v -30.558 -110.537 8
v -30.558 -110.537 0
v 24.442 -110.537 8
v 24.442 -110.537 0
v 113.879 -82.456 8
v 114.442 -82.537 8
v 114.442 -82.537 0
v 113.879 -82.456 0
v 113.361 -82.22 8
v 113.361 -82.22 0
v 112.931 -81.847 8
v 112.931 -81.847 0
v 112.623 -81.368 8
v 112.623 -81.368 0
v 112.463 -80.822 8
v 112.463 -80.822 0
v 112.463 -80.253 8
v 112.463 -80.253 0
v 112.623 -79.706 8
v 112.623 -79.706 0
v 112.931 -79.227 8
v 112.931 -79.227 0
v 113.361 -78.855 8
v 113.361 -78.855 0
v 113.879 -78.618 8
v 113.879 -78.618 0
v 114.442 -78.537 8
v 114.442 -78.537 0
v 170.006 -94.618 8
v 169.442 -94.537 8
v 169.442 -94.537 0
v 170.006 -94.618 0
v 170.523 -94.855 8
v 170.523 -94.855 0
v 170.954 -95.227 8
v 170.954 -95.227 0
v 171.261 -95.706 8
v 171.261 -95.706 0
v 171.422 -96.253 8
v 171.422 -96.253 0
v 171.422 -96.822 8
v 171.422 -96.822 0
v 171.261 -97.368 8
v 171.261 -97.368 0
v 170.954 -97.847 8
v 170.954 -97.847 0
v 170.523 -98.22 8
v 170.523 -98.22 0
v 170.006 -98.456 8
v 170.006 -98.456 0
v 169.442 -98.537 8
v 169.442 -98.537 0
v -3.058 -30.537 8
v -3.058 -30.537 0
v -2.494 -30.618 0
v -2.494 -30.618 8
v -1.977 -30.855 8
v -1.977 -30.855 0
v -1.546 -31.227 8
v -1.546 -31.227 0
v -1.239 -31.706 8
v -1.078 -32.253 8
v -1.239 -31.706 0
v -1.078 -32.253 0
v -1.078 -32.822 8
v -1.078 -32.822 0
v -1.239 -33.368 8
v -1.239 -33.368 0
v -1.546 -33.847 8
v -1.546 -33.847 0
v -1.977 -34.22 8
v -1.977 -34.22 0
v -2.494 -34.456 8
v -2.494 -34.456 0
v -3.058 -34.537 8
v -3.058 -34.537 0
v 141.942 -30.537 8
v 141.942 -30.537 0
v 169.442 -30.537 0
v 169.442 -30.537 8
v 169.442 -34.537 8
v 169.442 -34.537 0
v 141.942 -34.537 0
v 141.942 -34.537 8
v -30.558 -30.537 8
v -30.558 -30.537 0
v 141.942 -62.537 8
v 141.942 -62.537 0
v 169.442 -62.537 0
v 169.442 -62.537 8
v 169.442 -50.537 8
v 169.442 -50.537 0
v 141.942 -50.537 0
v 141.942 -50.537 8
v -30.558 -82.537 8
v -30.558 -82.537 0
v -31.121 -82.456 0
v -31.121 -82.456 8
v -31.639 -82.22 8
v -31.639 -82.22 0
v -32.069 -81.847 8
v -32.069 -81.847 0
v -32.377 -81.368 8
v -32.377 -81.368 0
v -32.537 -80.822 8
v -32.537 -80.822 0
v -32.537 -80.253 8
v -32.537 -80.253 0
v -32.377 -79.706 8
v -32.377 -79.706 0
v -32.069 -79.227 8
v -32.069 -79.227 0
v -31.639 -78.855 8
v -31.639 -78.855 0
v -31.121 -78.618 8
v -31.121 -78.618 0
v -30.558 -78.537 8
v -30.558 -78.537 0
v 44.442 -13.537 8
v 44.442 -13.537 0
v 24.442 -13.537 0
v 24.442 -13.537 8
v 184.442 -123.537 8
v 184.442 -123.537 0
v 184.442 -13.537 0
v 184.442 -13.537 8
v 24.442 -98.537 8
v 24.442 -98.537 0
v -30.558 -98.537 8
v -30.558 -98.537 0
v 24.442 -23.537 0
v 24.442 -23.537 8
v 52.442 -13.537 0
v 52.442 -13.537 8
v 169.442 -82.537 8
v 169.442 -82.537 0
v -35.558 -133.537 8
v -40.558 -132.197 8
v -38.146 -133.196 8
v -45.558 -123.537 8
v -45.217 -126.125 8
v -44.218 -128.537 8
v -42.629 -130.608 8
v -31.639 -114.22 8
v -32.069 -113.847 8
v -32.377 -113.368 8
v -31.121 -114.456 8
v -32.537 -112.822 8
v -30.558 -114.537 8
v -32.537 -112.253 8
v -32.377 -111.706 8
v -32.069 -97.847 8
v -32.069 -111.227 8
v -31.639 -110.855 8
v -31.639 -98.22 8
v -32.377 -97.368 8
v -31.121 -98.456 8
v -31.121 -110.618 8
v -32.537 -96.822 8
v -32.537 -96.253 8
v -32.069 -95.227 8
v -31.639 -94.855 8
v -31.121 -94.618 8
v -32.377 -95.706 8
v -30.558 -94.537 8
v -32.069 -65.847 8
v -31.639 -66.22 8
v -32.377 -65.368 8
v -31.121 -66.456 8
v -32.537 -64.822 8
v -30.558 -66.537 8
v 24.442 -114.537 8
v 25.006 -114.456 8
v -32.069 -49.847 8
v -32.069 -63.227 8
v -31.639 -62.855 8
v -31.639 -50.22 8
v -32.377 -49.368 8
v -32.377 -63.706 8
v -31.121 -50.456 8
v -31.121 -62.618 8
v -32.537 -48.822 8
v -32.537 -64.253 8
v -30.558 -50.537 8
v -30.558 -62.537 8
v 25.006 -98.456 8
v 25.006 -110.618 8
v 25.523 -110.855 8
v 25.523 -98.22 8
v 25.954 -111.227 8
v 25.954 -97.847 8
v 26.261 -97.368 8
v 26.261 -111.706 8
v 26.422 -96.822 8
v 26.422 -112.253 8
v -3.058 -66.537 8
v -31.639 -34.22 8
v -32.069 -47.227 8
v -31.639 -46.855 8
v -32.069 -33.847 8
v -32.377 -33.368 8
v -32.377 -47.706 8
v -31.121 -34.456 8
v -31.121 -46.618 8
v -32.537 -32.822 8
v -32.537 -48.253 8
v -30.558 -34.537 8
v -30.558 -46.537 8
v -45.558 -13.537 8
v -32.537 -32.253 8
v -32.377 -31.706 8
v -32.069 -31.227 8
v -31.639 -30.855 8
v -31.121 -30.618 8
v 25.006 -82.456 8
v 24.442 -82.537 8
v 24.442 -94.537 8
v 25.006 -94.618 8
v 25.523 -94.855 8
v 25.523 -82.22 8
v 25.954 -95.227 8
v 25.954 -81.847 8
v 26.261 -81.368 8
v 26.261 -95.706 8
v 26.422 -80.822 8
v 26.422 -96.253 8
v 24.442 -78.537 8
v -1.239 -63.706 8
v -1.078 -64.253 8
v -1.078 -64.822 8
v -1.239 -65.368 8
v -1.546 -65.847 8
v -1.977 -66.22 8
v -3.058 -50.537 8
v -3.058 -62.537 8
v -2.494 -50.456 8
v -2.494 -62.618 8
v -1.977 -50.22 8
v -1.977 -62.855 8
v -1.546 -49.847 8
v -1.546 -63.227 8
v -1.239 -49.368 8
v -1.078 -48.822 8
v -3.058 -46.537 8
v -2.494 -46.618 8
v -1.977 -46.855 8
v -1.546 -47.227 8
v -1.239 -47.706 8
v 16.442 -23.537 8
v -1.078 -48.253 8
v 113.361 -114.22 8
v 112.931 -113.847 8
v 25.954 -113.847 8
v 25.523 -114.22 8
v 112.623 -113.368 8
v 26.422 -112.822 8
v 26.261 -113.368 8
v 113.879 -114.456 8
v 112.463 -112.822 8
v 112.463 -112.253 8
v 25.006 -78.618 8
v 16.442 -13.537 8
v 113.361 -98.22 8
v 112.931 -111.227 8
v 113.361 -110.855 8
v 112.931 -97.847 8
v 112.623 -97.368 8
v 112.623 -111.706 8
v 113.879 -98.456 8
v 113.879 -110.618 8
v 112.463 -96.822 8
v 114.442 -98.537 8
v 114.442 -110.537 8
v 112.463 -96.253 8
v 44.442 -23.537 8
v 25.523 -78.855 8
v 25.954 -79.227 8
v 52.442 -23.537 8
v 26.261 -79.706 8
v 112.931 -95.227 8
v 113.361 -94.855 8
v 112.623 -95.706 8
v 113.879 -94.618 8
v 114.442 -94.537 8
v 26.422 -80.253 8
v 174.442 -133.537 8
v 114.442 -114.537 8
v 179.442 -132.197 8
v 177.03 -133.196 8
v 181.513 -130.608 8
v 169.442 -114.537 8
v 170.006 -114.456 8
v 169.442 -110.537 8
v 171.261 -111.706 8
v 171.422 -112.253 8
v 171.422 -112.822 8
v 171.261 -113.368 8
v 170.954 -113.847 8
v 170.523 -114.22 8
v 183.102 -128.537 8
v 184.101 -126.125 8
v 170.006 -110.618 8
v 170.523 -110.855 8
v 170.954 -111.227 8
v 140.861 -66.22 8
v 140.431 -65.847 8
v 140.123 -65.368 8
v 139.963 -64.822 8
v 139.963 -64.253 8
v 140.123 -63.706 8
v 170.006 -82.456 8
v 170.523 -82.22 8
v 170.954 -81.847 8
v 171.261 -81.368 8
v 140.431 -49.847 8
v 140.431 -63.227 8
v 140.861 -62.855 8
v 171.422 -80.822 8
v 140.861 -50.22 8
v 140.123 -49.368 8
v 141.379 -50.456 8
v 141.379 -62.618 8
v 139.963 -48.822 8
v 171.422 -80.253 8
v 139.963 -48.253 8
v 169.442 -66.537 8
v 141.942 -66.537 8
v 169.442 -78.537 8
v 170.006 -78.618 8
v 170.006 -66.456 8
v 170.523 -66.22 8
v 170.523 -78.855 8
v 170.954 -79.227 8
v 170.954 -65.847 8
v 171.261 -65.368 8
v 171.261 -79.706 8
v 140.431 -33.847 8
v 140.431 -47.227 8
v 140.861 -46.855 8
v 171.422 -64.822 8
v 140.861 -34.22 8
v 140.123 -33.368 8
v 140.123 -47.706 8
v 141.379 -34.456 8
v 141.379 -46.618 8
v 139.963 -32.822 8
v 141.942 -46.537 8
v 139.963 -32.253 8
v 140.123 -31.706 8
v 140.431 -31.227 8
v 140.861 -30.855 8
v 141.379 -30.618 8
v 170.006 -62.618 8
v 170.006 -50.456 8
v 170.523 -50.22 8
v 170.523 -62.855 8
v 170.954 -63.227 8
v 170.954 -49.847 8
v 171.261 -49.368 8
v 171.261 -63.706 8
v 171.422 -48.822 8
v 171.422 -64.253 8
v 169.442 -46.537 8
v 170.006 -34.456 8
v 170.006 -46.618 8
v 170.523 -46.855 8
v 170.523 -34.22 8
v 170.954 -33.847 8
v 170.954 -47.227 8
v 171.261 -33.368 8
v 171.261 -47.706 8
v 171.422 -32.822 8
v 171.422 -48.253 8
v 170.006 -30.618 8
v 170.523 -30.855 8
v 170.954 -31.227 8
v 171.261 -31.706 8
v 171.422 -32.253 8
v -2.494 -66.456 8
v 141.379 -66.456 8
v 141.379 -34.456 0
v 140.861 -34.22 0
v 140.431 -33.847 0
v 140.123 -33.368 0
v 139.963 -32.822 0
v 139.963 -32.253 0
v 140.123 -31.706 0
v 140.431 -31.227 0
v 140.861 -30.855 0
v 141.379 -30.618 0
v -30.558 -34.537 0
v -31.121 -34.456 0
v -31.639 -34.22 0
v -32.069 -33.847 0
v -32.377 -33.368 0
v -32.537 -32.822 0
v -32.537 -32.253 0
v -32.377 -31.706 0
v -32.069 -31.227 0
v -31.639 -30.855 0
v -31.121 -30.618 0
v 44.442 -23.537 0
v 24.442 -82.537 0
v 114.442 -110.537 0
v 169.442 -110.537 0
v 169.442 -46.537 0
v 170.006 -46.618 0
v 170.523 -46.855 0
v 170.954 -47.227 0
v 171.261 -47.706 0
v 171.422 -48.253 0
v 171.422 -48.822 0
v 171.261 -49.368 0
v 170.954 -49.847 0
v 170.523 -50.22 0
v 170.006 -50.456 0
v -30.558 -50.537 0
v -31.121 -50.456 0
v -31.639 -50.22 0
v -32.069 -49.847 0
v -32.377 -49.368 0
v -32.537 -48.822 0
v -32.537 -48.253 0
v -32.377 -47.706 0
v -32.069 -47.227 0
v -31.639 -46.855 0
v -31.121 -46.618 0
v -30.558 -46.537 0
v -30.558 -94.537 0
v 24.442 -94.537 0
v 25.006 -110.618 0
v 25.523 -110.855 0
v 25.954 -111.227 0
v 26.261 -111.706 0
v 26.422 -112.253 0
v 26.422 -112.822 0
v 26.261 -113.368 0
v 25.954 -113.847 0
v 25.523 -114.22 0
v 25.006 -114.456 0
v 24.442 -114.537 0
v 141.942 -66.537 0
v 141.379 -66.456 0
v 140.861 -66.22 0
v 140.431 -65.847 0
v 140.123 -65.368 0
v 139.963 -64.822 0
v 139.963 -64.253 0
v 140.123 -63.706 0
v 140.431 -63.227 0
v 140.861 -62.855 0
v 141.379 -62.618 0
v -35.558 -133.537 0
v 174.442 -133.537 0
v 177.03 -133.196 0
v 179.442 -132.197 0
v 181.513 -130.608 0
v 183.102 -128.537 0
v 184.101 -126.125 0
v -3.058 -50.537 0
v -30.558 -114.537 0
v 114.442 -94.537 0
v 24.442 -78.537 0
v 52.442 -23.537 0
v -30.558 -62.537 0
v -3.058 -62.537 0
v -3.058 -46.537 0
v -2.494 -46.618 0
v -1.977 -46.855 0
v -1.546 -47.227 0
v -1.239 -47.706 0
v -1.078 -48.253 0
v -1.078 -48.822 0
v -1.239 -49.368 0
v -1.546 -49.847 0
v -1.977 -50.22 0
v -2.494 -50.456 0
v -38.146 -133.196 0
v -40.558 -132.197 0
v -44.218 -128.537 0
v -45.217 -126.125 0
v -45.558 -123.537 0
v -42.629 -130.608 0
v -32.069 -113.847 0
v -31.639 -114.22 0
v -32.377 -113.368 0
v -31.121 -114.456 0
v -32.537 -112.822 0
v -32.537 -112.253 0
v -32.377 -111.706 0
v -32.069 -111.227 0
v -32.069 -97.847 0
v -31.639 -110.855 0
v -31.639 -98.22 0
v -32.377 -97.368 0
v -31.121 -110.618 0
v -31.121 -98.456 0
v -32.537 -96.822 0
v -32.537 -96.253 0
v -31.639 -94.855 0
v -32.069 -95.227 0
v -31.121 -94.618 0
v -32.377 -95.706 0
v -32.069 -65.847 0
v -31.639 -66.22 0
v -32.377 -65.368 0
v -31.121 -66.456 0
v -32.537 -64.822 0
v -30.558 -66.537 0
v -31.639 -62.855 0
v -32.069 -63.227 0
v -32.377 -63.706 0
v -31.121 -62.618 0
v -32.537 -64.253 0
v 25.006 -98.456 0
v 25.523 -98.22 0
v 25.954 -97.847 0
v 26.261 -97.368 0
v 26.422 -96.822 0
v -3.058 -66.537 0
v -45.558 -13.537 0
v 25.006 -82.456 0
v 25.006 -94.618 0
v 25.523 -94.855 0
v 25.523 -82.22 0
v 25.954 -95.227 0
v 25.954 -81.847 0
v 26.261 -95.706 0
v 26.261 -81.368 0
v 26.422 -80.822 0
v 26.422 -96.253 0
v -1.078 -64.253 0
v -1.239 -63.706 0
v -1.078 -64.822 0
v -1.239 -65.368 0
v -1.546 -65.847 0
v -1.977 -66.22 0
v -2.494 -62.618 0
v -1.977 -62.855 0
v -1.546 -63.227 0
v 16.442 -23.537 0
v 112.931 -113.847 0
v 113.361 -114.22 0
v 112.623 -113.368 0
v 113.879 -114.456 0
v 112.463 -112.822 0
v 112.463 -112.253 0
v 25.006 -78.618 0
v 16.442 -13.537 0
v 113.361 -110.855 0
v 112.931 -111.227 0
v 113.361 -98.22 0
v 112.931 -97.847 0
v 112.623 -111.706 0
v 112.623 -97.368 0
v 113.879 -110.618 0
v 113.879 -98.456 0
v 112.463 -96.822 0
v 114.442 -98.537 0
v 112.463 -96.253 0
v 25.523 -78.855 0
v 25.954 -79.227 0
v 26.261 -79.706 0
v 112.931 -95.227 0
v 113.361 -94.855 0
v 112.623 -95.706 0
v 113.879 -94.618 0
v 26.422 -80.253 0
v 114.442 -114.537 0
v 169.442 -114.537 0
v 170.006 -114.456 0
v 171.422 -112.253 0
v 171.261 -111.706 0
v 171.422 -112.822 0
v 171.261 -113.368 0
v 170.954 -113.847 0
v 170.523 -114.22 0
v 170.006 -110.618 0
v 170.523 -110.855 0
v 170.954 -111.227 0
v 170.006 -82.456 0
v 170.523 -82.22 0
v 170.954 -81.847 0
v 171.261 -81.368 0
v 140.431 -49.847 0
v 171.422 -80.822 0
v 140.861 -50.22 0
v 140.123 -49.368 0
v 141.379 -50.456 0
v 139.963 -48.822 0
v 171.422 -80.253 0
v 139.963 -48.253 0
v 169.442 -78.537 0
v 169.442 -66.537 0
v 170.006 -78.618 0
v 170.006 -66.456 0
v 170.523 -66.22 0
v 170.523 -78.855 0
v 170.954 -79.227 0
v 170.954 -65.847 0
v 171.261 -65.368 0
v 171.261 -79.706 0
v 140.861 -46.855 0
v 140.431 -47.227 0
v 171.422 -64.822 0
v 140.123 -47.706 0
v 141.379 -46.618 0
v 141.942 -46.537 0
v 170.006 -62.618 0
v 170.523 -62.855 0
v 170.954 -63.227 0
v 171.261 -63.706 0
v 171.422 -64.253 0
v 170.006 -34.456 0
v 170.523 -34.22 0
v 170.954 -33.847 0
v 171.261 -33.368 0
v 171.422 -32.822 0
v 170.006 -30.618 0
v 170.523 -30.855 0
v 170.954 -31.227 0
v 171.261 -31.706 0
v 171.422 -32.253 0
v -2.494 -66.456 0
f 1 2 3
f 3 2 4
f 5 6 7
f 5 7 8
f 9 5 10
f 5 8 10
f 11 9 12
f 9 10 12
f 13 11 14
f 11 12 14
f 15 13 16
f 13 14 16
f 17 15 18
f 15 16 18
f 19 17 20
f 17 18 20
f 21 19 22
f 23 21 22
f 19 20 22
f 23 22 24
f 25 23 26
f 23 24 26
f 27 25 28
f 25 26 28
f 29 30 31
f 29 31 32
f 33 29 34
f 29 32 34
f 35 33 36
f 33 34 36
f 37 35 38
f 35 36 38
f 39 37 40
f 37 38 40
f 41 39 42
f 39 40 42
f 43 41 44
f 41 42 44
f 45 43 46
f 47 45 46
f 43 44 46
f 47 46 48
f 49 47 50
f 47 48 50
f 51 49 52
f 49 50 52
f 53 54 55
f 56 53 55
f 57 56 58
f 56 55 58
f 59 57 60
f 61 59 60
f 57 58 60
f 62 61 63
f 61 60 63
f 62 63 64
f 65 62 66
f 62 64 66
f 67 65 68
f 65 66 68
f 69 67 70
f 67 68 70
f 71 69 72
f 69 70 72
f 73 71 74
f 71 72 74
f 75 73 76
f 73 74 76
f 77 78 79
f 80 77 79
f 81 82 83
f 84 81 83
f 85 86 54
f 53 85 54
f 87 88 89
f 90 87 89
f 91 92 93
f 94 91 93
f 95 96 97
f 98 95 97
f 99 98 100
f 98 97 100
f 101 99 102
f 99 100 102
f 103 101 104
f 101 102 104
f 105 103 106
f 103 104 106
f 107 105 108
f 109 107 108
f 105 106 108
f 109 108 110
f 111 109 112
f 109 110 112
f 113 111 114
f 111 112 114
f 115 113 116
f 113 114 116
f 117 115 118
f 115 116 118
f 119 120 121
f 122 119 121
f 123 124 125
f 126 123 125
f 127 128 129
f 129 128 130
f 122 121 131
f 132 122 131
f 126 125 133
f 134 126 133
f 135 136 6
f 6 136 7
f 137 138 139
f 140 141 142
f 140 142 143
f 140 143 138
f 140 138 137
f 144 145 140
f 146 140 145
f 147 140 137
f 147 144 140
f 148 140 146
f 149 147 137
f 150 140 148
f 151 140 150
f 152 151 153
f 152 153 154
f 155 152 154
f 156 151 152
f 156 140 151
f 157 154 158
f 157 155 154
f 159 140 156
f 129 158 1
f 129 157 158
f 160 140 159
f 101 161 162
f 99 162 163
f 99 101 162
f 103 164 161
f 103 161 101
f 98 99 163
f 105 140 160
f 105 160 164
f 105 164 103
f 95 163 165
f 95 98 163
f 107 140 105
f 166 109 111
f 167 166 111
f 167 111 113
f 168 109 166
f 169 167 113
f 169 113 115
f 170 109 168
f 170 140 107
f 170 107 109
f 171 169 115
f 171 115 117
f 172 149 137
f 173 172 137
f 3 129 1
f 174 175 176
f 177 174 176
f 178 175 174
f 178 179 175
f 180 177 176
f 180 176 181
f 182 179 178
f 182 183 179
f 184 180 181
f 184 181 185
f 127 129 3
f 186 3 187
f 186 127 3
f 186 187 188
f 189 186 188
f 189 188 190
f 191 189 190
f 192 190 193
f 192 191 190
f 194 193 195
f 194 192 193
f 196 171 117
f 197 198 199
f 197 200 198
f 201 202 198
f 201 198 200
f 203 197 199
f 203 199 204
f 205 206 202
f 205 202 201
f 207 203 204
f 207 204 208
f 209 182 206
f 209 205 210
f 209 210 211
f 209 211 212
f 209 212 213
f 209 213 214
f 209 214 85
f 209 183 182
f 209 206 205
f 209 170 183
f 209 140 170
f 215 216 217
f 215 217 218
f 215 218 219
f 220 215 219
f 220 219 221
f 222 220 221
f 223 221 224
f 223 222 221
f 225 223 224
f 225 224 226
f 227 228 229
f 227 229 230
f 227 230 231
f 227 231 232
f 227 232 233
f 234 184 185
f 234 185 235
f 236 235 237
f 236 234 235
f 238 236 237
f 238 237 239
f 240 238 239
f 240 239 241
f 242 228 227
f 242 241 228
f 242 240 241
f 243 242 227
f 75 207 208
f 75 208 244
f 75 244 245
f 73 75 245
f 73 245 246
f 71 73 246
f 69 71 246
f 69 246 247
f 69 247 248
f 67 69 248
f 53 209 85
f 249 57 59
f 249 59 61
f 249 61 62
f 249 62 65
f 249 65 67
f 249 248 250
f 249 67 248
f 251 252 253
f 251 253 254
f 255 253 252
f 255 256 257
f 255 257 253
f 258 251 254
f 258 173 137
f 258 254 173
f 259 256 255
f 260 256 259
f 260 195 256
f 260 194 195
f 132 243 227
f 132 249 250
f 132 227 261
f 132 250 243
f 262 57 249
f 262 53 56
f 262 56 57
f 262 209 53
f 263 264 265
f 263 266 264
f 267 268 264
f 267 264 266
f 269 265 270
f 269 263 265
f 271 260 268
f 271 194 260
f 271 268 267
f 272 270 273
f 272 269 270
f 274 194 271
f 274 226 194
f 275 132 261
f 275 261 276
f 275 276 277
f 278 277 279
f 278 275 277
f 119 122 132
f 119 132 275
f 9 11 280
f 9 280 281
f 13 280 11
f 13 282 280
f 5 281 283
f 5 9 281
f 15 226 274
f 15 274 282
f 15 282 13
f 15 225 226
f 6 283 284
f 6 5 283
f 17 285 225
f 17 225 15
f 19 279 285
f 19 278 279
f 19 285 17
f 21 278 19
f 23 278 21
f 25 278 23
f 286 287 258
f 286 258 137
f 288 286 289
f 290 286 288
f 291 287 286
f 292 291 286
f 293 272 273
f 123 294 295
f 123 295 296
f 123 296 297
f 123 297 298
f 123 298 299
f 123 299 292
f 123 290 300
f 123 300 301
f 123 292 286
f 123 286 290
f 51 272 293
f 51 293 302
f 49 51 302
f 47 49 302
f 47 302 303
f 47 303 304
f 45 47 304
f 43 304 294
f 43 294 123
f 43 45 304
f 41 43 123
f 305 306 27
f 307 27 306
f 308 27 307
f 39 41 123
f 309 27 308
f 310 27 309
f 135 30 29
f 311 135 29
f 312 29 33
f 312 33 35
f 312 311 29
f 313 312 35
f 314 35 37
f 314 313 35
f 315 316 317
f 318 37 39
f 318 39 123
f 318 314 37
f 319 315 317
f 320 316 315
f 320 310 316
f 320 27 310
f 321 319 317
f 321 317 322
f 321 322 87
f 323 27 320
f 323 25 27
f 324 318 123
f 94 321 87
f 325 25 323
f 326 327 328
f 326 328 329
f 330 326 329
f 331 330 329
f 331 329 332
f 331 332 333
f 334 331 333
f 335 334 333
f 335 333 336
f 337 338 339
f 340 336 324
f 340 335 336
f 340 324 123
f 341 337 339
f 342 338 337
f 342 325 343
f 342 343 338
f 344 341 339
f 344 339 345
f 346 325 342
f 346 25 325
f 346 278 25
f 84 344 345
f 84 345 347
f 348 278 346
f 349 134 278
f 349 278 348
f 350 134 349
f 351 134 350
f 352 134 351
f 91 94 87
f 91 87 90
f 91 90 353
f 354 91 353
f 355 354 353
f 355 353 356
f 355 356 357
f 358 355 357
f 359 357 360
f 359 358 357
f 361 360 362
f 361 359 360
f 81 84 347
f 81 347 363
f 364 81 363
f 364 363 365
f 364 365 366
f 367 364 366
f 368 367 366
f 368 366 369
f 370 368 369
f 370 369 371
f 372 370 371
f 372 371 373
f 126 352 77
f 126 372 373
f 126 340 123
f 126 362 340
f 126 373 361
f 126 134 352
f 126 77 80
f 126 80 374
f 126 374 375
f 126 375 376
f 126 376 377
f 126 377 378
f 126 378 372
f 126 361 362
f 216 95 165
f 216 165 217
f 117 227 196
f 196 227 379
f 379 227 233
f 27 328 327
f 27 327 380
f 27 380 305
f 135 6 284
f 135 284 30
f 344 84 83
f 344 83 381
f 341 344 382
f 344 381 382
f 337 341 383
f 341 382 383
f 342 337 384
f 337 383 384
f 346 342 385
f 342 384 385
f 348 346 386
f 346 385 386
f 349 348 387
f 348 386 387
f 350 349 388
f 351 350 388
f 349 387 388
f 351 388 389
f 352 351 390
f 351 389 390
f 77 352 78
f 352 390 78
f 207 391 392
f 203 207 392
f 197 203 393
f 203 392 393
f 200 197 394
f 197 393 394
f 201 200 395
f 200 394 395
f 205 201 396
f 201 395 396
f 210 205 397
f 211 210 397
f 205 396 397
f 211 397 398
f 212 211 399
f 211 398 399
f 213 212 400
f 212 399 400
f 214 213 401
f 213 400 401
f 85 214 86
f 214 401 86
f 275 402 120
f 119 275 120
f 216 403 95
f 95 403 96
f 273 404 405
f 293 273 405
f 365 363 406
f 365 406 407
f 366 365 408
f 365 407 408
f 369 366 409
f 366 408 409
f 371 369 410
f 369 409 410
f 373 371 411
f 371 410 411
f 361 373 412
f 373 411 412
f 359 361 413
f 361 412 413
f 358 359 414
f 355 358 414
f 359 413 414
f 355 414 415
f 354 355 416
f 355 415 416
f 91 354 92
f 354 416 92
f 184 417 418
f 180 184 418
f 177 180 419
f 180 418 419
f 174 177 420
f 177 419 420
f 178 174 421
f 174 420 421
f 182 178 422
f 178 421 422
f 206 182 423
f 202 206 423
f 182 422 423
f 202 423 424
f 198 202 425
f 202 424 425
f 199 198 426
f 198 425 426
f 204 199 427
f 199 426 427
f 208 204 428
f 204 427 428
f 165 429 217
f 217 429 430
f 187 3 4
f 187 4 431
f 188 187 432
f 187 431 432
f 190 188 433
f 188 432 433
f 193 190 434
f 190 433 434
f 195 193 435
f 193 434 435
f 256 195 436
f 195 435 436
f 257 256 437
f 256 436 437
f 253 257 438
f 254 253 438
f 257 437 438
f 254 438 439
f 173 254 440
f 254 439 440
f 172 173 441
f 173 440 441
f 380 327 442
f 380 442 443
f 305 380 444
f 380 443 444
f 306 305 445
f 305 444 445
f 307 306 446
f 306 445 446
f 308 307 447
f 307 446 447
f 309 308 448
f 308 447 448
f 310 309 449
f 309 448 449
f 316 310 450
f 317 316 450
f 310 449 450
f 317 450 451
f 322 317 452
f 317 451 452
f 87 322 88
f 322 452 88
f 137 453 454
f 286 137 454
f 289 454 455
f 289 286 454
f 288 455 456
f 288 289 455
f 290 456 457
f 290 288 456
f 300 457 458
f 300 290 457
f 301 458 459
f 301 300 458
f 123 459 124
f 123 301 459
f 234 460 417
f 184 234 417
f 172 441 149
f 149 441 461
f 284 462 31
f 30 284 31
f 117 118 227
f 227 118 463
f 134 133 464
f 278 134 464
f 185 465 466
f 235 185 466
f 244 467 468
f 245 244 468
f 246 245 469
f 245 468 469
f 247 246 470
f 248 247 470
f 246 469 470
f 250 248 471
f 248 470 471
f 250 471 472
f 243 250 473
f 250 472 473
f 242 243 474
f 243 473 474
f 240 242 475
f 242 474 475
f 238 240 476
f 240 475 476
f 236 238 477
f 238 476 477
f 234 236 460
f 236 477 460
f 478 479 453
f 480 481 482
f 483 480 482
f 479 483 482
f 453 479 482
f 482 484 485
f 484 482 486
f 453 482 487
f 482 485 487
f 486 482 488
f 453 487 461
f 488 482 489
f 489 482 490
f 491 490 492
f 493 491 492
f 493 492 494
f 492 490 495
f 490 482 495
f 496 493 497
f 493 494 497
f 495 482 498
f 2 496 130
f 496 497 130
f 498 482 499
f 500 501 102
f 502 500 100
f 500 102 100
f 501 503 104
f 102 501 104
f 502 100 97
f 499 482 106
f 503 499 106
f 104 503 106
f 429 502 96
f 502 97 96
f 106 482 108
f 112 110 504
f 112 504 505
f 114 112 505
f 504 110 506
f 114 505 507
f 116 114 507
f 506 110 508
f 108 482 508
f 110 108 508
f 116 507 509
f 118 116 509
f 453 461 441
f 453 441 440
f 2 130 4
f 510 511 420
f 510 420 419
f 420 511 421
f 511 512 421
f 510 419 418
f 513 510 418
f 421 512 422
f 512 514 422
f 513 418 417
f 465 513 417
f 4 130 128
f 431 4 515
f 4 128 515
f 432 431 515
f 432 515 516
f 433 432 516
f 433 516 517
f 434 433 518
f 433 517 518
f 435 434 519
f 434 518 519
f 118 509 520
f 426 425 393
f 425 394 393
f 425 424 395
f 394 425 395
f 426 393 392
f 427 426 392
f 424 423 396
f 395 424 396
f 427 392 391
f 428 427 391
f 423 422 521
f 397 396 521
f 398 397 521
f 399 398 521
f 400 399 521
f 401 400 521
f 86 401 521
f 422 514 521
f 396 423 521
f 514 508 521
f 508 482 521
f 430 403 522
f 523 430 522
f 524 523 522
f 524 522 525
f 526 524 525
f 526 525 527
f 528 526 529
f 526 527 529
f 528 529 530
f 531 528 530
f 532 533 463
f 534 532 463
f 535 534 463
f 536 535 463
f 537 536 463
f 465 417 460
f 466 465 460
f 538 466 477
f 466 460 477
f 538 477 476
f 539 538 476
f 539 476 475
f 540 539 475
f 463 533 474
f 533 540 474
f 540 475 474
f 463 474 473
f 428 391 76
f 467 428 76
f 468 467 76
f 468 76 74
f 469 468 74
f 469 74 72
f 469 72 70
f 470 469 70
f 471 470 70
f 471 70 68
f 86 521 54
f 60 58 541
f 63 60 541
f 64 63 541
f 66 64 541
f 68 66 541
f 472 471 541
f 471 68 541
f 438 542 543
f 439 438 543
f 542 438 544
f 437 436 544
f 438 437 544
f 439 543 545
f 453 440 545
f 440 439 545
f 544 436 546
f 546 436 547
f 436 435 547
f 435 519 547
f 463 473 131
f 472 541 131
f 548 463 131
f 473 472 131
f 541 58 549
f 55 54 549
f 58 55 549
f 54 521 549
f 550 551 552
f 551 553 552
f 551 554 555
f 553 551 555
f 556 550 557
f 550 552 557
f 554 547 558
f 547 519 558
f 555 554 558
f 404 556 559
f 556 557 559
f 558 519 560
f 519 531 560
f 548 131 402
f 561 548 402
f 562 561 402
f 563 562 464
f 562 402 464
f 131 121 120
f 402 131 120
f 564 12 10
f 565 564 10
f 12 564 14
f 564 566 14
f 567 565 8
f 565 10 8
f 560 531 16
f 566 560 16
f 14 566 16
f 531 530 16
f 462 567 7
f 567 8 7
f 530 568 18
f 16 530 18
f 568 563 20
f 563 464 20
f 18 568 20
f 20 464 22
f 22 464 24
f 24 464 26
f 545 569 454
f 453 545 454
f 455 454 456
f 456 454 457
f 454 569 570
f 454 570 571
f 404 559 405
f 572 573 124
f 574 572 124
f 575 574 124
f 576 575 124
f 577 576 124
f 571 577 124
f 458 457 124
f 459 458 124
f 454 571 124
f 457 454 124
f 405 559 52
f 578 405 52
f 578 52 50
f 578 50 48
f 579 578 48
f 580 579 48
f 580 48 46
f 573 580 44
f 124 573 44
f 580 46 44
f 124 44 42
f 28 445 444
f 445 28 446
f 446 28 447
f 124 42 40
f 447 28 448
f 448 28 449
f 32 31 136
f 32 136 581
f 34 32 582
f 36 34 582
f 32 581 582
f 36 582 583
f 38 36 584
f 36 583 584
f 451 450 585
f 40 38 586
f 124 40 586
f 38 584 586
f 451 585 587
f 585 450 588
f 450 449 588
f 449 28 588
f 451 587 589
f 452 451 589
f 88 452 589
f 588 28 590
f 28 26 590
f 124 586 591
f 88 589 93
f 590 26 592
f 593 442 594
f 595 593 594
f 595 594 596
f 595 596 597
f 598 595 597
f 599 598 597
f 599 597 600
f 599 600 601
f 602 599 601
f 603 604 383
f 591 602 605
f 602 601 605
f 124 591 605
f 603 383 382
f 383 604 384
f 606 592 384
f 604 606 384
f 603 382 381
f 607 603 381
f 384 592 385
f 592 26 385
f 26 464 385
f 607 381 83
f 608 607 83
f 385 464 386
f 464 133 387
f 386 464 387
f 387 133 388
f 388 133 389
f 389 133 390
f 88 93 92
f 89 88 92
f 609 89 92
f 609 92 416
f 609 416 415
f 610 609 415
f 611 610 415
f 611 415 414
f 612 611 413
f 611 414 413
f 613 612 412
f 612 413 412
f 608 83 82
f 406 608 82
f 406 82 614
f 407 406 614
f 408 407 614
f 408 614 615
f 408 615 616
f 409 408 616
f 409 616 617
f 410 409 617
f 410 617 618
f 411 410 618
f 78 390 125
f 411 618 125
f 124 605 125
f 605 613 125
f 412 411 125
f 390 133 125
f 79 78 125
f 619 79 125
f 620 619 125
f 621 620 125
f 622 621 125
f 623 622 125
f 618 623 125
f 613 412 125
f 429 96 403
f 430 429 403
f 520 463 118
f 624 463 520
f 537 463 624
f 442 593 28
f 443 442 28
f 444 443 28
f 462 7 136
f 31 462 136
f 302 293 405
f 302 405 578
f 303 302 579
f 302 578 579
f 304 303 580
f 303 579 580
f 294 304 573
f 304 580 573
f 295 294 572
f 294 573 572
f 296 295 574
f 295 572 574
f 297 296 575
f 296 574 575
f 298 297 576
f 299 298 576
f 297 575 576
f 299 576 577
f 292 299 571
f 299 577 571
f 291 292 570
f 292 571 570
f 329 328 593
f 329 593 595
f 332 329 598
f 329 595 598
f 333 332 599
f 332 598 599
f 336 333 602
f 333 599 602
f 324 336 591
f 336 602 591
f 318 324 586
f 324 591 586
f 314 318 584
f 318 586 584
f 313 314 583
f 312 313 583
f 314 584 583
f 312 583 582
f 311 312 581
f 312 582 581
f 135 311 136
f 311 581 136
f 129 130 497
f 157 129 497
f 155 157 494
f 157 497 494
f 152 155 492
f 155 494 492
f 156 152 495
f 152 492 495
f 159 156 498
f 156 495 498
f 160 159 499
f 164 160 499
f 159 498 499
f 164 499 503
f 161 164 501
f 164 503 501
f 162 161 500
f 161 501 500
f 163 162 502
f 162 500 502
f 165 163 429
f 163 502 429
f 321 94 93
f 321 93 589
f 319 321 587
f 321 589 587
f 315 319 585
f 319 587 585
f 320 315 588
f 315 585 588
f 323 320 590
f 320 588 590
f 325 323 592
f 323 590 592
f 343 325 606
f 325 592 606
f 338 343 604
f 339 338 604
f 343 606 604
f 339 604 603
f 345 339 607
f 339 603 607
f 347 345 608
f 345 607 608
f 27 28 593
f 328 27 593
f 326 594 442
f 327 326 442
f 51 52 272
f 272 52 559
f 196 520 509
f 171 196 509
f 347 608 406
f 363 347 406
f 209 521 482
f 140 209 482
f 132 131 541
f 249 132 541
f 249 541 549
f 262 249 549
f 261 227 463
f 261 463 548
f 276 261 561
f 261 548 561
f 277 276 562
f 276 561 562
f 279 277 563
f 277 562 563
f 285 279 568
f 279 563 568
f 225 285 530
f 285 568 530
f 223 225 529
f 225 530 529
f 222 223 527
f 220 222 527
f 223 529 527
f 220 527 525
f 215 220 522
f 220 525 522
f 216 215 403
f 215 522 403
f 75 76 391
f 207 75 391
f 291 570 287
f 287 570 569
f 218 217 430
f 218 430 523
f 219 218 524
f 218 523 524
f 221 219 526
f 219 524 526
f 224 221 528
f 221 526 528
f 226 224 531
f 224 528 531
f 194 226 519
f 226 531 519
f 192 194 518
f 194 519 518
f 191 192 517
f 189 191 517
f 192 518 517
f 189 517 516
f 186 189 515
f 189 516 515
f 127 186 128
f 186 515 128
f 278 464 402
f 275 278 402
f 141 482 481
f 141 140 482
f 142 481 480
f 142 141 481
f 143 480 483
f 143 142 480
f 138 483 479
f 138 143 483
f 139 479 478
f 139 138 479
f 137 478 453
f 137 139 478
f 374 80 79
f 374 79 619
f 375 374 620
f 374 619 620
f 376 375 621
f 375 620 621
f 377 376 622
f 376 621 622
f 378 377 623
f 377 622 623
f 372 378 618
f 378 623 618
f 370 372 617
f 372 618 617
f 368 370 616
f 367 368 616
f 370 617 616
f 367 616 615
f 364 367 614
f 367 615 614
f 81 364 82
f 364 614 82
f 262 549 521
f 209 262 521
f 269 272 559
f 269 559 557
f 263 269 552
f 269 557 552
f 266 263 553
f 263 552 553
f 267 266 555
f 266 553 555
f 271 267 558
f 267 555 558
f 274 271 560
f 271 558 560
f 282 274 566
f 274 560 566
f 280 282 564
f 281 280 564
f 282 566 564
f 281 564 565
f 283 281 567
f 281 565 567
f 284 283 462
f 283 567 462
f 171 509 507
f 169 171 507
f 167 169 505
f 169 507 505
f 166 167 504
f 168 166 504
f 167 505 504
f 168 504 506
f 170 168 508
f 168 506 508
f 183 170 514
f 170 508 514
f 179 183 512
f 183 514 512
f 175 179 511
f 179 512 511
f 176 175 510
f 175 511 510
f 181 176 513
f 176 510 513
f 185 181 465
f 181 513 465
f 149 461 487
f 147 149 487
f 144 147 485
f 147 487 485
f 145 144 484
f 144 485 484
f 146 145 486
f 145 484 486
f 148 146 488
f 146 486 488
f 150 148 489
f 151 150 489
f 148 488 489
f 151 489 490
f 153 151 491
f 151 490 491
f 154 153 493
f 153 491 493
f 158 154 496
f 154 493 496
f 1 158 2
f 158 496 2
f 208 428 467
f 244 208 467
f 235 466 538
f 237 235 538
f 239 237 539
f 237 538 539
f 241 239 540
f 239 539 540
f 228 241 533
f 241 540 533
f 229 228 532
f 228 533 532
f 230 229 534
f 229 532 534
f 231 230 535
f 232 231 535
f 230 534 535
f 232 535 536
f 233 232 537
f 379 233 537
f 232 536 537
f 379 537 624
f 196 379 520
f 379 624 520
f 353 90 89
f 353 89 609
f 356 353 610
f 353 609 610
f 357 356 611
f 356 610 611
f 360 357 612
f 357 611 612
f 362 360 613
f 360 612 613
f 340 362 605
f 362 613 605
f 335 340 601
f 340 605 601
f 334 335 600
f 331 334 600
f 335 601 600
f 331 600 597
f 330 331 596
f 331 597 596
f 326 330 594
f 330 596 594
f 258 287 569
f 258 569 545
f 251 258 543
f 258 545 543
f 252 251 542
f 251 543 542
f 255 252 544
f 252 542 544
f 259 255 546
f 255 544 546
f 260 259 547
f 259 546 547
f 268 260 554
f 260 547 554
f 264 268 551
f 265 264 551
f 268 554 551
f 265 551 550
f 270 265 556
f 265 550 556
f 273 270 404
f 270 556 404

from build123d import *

# Parameters (mm, degrees)
F1_DEPTH = 8
F2_R     = 10


with BuildPart() as f1:
    # F0 (on Top) → F1 (new body)
    with BuildSketch(Plane.XY):
        Polygon((16.4421471655, -13.5372191966), (-45.5578528345, -13.5372191966), (-45.5578528345, -133.5372191966), (184.4421471655, -133.5372191966), (184.4421471655, -13.5372191966), (52.4421471655, -13.5372191966), (52.4421471655, -23.5372191966), (44.4421471655, -23.5372191966), (44.4421471655, -13.5372191966), (24.4421471655, -13.5372191966), (24.4421471655, -23.5372191966), (16.4421471655, -23.5372191966), align=None)
        with BuildLine():
            ThreePointArc((-30.5578528345, -114.5372191966), (-32.5578528345, -112.5372191966), (-30.5578528345, -110.5372191966))
            Line((-30.5578528345, -110.5372191966), (24.4421471655, -110.5372191966))
            ThreePointArc((24.4421471655, -110.5372191966), (26.4421471655, -112.5372191966), (24.4421471655, -114.5372191966))
            Line((24.4421471655, -114.5372191966), (-30.5578528345, -114.5372191966))
        make_face(mode=Mode.SUBTRACT)
        with BuildLine():
            ThreePointArc((-30.5578528345, -98.5372191966), (-32.5578528345, -96.5372191966), (-30.5578528345, -94.5372191966))
            Line((-30.5578528345, -94.5372191966), (24.4421471655, -94.5372191966))
            ThreePointArc((24.4421471655, -94.5372191966), (26.4421471655, -96.5372191966), (24.4421471655, -98.5372191966))
            Line((24.4421471655, -98.5372191966), (-30.5578528345, -98.5372191966))
        make_face(mode=Mode.SUBTRACT)
        with BuildLine():
            Line((24.4421471655, -82.5372191966), (-30.5578528345, -82.5372191966))
            ThreePointArc((-30.5578528345, -82.5372191966), (-32.5578528345, -80.5372191966), (-30.5578528345, -78.5372191966))
            Line((-30.5578528345, -78.5372191966), (24.4421471655, -78.5372191966))
            ThreePointArc((24.4421471655, -78.5372191966), (26.4421471655, -80.5372191966), (24.4421471655, -82.5372191966))
        make_face(mode=Mode.SUBTRACT)
        with BuildLine():
            ThreePointArc((169.4421471655, -110.5372191966), (171.4421471655, -112.5372191966), (169.4421471655, -114.5372191966))
            Line((169.4421471655, -114.5372191966), (114.4421471655, -114.5372191966))
            ThreePointArc((114.4421471655, -114.5372191966), (112.4421471655, -112.5372191966), (114.4421471655, -110.5372191966))
            Line((114.4421471655, -110.5372191966), (169.4421471655, -110.5372191966))
        make_face(mode=Mode.SUBTRACT)
        with BuildLine():
            ThreePointArc((169.4421471655, -94.5372191966), (171.4421471655, -96.5372191966), (169.4421471655, -98.5372191966))
            Line((169.4421471655, -98.5372191966), (114.4421471655, -98.5372191966))
            ThreePointArc((114.4421471655, -98.5372191966), (112.4421471655, -96.5372191966), (114.4421471655, -94.5372191966))
            Line((114.4421471655, -94.5372191966), (169.4421471655, -94.5372191966))
        make_face(mode=Mode.SUBTRACT)
        with BuildLine():
            ThreePointArc((169.4421471655, -78.5372191966), (171.4421471655, -80.5372191966), (169.4421471655, -82.5372191966))
            Line((169.4421471655, -82.5372191966), (114.4421471655, -82.5372191966))
            ThreePointArc((114.4421471655, -82.5372191966), (112.4421471655, -80.5372191966), (114.4421471655, -78.5372191966))
            Line((114.4421471655, -78.5372191966), (169.4421471655, -78.5372191966))
        make_face(mode=Mode.SUBTRACT)
        with BuildLine():
            Line((-3.0578528345, -66.5372191966), (-30.5578528345, -66.5372191966))
            ThreePointArc((-30.5578528345, -66.5372191966), (-32.5578528345, -64.5372191966), (-30.5578528345, -62.5372191966))
            Line((-30.5578528345, -62.5372191966), (-3.0578528345, -62.5372191966))
            ThreePointArc((-3.0578528345, -62.5372191966), (-1.0578528345, -64.5372191966), (-3.0578528345, -66.5372191966))
        make_face(mode=Mode.SUBTRACT)
        with BuildLine():
            Line((-3.0578528345, -50.5372191966), (-30.5578528345, -50.5372191966))
            ThreePointArc((-30.5578528345, -50.5372191966), (-32.5578528345, -48.5372191966), (-30.5578528345, -46.5372191966))
            Line((-30.5578528345, -46.5372191966), (-3.0578528345, -46.5372191966))
            ThreePointArc((-3.0578528345, -46.5372191966), (-1.0578528345, -48.5372191966), (-3.0578528345, -50.5372191966))
        make_face(mode=Mode.SUBTRACT)
        with BuildLine():
            Line((-3.0578528345, -34.5372191966), (-30.5578528345, -34.5372191966))
            ThreePointArc((-30.5578528345, -34.5372191966), (-32.5578528345, -32.5372191966), (-30.5578528345, -30.5372191966))
            Line((-30.5578528345, -30.5372191966), (-3.0578528345, -30.5372191966))
            ThreePointArc((-3.0578528345, -30.5372191966), (-1.0578528345, -32.5372191966), (-3.0578528345, -34.5372191966))
        make_face(mode=Mode.SUBTRACT)
        with BuildLine():
            ThreePointArc((169.4421471655, -62.5372191966), (171.4421471655, -64.5372191966), (169.4421471655, -66.5372191966))
            Line((169.4421471655, -66.5372191966), (141.9421471655, -66.5372191966))
            ThreePointArc((141.9421471655, -66.5372191966), (139.9421471655, -64.5372191966), (141.9421471655, -62.5372191966))
            Line((141.9421471655, -62.5372191966), (169.4421471655, -62.5372191966))
        make_face(mode=Mode.SUBTRACT)
        with BuildLine():
            ThreePointArc((169.4421471655, -46.5372191966), (171.4421471655, -48.5372191966), (169.4421471655, -50.5372191966))
            Line((169.4421471655, -50.5372191966), (141.9421471655, -50.5372191966))
            ThreePointArc((141.9421471655, -50.5372191966), (139.9421471655, -48.5372191966), (141.9421471655, -46.5372191966))
            Line((141.9421471655, -46.5372191966), (169.4421471655, -46.5372191966))
        make_face(mode=Mode.SUBTRACT)
        with BuildLine():
            ThreePointArc((169.4421471655, -30.5372191966), (171.4421471655, -32.5372191966), (169.4421471655, -34.5372191966))
            Line((169.4421471655, -34.5372191966), (141.9421471655, -34.5372191966))
            ThreePointArc((141.9421471655, -34.5372191966), (139.9421471655, -32.5372191966), (141.9421471655, -30.5372191966))
            Line((141.9421471655, -30.5372191966), (169.4421471655, -30.5372191966))
        make_face(mode=Mode.SUBTRACT)
    extrude(amount=F1_DEPTH)

    # F2
    f2_edges = [f1.edges().sort_by_distance(p)[0] for p in [
        (-45.557853, -133.537219, 4),
        (184.442147, -133.537219, 4),
    ]]
    fillet(f2_edges, radius=F2_R)


solid = f1.part
